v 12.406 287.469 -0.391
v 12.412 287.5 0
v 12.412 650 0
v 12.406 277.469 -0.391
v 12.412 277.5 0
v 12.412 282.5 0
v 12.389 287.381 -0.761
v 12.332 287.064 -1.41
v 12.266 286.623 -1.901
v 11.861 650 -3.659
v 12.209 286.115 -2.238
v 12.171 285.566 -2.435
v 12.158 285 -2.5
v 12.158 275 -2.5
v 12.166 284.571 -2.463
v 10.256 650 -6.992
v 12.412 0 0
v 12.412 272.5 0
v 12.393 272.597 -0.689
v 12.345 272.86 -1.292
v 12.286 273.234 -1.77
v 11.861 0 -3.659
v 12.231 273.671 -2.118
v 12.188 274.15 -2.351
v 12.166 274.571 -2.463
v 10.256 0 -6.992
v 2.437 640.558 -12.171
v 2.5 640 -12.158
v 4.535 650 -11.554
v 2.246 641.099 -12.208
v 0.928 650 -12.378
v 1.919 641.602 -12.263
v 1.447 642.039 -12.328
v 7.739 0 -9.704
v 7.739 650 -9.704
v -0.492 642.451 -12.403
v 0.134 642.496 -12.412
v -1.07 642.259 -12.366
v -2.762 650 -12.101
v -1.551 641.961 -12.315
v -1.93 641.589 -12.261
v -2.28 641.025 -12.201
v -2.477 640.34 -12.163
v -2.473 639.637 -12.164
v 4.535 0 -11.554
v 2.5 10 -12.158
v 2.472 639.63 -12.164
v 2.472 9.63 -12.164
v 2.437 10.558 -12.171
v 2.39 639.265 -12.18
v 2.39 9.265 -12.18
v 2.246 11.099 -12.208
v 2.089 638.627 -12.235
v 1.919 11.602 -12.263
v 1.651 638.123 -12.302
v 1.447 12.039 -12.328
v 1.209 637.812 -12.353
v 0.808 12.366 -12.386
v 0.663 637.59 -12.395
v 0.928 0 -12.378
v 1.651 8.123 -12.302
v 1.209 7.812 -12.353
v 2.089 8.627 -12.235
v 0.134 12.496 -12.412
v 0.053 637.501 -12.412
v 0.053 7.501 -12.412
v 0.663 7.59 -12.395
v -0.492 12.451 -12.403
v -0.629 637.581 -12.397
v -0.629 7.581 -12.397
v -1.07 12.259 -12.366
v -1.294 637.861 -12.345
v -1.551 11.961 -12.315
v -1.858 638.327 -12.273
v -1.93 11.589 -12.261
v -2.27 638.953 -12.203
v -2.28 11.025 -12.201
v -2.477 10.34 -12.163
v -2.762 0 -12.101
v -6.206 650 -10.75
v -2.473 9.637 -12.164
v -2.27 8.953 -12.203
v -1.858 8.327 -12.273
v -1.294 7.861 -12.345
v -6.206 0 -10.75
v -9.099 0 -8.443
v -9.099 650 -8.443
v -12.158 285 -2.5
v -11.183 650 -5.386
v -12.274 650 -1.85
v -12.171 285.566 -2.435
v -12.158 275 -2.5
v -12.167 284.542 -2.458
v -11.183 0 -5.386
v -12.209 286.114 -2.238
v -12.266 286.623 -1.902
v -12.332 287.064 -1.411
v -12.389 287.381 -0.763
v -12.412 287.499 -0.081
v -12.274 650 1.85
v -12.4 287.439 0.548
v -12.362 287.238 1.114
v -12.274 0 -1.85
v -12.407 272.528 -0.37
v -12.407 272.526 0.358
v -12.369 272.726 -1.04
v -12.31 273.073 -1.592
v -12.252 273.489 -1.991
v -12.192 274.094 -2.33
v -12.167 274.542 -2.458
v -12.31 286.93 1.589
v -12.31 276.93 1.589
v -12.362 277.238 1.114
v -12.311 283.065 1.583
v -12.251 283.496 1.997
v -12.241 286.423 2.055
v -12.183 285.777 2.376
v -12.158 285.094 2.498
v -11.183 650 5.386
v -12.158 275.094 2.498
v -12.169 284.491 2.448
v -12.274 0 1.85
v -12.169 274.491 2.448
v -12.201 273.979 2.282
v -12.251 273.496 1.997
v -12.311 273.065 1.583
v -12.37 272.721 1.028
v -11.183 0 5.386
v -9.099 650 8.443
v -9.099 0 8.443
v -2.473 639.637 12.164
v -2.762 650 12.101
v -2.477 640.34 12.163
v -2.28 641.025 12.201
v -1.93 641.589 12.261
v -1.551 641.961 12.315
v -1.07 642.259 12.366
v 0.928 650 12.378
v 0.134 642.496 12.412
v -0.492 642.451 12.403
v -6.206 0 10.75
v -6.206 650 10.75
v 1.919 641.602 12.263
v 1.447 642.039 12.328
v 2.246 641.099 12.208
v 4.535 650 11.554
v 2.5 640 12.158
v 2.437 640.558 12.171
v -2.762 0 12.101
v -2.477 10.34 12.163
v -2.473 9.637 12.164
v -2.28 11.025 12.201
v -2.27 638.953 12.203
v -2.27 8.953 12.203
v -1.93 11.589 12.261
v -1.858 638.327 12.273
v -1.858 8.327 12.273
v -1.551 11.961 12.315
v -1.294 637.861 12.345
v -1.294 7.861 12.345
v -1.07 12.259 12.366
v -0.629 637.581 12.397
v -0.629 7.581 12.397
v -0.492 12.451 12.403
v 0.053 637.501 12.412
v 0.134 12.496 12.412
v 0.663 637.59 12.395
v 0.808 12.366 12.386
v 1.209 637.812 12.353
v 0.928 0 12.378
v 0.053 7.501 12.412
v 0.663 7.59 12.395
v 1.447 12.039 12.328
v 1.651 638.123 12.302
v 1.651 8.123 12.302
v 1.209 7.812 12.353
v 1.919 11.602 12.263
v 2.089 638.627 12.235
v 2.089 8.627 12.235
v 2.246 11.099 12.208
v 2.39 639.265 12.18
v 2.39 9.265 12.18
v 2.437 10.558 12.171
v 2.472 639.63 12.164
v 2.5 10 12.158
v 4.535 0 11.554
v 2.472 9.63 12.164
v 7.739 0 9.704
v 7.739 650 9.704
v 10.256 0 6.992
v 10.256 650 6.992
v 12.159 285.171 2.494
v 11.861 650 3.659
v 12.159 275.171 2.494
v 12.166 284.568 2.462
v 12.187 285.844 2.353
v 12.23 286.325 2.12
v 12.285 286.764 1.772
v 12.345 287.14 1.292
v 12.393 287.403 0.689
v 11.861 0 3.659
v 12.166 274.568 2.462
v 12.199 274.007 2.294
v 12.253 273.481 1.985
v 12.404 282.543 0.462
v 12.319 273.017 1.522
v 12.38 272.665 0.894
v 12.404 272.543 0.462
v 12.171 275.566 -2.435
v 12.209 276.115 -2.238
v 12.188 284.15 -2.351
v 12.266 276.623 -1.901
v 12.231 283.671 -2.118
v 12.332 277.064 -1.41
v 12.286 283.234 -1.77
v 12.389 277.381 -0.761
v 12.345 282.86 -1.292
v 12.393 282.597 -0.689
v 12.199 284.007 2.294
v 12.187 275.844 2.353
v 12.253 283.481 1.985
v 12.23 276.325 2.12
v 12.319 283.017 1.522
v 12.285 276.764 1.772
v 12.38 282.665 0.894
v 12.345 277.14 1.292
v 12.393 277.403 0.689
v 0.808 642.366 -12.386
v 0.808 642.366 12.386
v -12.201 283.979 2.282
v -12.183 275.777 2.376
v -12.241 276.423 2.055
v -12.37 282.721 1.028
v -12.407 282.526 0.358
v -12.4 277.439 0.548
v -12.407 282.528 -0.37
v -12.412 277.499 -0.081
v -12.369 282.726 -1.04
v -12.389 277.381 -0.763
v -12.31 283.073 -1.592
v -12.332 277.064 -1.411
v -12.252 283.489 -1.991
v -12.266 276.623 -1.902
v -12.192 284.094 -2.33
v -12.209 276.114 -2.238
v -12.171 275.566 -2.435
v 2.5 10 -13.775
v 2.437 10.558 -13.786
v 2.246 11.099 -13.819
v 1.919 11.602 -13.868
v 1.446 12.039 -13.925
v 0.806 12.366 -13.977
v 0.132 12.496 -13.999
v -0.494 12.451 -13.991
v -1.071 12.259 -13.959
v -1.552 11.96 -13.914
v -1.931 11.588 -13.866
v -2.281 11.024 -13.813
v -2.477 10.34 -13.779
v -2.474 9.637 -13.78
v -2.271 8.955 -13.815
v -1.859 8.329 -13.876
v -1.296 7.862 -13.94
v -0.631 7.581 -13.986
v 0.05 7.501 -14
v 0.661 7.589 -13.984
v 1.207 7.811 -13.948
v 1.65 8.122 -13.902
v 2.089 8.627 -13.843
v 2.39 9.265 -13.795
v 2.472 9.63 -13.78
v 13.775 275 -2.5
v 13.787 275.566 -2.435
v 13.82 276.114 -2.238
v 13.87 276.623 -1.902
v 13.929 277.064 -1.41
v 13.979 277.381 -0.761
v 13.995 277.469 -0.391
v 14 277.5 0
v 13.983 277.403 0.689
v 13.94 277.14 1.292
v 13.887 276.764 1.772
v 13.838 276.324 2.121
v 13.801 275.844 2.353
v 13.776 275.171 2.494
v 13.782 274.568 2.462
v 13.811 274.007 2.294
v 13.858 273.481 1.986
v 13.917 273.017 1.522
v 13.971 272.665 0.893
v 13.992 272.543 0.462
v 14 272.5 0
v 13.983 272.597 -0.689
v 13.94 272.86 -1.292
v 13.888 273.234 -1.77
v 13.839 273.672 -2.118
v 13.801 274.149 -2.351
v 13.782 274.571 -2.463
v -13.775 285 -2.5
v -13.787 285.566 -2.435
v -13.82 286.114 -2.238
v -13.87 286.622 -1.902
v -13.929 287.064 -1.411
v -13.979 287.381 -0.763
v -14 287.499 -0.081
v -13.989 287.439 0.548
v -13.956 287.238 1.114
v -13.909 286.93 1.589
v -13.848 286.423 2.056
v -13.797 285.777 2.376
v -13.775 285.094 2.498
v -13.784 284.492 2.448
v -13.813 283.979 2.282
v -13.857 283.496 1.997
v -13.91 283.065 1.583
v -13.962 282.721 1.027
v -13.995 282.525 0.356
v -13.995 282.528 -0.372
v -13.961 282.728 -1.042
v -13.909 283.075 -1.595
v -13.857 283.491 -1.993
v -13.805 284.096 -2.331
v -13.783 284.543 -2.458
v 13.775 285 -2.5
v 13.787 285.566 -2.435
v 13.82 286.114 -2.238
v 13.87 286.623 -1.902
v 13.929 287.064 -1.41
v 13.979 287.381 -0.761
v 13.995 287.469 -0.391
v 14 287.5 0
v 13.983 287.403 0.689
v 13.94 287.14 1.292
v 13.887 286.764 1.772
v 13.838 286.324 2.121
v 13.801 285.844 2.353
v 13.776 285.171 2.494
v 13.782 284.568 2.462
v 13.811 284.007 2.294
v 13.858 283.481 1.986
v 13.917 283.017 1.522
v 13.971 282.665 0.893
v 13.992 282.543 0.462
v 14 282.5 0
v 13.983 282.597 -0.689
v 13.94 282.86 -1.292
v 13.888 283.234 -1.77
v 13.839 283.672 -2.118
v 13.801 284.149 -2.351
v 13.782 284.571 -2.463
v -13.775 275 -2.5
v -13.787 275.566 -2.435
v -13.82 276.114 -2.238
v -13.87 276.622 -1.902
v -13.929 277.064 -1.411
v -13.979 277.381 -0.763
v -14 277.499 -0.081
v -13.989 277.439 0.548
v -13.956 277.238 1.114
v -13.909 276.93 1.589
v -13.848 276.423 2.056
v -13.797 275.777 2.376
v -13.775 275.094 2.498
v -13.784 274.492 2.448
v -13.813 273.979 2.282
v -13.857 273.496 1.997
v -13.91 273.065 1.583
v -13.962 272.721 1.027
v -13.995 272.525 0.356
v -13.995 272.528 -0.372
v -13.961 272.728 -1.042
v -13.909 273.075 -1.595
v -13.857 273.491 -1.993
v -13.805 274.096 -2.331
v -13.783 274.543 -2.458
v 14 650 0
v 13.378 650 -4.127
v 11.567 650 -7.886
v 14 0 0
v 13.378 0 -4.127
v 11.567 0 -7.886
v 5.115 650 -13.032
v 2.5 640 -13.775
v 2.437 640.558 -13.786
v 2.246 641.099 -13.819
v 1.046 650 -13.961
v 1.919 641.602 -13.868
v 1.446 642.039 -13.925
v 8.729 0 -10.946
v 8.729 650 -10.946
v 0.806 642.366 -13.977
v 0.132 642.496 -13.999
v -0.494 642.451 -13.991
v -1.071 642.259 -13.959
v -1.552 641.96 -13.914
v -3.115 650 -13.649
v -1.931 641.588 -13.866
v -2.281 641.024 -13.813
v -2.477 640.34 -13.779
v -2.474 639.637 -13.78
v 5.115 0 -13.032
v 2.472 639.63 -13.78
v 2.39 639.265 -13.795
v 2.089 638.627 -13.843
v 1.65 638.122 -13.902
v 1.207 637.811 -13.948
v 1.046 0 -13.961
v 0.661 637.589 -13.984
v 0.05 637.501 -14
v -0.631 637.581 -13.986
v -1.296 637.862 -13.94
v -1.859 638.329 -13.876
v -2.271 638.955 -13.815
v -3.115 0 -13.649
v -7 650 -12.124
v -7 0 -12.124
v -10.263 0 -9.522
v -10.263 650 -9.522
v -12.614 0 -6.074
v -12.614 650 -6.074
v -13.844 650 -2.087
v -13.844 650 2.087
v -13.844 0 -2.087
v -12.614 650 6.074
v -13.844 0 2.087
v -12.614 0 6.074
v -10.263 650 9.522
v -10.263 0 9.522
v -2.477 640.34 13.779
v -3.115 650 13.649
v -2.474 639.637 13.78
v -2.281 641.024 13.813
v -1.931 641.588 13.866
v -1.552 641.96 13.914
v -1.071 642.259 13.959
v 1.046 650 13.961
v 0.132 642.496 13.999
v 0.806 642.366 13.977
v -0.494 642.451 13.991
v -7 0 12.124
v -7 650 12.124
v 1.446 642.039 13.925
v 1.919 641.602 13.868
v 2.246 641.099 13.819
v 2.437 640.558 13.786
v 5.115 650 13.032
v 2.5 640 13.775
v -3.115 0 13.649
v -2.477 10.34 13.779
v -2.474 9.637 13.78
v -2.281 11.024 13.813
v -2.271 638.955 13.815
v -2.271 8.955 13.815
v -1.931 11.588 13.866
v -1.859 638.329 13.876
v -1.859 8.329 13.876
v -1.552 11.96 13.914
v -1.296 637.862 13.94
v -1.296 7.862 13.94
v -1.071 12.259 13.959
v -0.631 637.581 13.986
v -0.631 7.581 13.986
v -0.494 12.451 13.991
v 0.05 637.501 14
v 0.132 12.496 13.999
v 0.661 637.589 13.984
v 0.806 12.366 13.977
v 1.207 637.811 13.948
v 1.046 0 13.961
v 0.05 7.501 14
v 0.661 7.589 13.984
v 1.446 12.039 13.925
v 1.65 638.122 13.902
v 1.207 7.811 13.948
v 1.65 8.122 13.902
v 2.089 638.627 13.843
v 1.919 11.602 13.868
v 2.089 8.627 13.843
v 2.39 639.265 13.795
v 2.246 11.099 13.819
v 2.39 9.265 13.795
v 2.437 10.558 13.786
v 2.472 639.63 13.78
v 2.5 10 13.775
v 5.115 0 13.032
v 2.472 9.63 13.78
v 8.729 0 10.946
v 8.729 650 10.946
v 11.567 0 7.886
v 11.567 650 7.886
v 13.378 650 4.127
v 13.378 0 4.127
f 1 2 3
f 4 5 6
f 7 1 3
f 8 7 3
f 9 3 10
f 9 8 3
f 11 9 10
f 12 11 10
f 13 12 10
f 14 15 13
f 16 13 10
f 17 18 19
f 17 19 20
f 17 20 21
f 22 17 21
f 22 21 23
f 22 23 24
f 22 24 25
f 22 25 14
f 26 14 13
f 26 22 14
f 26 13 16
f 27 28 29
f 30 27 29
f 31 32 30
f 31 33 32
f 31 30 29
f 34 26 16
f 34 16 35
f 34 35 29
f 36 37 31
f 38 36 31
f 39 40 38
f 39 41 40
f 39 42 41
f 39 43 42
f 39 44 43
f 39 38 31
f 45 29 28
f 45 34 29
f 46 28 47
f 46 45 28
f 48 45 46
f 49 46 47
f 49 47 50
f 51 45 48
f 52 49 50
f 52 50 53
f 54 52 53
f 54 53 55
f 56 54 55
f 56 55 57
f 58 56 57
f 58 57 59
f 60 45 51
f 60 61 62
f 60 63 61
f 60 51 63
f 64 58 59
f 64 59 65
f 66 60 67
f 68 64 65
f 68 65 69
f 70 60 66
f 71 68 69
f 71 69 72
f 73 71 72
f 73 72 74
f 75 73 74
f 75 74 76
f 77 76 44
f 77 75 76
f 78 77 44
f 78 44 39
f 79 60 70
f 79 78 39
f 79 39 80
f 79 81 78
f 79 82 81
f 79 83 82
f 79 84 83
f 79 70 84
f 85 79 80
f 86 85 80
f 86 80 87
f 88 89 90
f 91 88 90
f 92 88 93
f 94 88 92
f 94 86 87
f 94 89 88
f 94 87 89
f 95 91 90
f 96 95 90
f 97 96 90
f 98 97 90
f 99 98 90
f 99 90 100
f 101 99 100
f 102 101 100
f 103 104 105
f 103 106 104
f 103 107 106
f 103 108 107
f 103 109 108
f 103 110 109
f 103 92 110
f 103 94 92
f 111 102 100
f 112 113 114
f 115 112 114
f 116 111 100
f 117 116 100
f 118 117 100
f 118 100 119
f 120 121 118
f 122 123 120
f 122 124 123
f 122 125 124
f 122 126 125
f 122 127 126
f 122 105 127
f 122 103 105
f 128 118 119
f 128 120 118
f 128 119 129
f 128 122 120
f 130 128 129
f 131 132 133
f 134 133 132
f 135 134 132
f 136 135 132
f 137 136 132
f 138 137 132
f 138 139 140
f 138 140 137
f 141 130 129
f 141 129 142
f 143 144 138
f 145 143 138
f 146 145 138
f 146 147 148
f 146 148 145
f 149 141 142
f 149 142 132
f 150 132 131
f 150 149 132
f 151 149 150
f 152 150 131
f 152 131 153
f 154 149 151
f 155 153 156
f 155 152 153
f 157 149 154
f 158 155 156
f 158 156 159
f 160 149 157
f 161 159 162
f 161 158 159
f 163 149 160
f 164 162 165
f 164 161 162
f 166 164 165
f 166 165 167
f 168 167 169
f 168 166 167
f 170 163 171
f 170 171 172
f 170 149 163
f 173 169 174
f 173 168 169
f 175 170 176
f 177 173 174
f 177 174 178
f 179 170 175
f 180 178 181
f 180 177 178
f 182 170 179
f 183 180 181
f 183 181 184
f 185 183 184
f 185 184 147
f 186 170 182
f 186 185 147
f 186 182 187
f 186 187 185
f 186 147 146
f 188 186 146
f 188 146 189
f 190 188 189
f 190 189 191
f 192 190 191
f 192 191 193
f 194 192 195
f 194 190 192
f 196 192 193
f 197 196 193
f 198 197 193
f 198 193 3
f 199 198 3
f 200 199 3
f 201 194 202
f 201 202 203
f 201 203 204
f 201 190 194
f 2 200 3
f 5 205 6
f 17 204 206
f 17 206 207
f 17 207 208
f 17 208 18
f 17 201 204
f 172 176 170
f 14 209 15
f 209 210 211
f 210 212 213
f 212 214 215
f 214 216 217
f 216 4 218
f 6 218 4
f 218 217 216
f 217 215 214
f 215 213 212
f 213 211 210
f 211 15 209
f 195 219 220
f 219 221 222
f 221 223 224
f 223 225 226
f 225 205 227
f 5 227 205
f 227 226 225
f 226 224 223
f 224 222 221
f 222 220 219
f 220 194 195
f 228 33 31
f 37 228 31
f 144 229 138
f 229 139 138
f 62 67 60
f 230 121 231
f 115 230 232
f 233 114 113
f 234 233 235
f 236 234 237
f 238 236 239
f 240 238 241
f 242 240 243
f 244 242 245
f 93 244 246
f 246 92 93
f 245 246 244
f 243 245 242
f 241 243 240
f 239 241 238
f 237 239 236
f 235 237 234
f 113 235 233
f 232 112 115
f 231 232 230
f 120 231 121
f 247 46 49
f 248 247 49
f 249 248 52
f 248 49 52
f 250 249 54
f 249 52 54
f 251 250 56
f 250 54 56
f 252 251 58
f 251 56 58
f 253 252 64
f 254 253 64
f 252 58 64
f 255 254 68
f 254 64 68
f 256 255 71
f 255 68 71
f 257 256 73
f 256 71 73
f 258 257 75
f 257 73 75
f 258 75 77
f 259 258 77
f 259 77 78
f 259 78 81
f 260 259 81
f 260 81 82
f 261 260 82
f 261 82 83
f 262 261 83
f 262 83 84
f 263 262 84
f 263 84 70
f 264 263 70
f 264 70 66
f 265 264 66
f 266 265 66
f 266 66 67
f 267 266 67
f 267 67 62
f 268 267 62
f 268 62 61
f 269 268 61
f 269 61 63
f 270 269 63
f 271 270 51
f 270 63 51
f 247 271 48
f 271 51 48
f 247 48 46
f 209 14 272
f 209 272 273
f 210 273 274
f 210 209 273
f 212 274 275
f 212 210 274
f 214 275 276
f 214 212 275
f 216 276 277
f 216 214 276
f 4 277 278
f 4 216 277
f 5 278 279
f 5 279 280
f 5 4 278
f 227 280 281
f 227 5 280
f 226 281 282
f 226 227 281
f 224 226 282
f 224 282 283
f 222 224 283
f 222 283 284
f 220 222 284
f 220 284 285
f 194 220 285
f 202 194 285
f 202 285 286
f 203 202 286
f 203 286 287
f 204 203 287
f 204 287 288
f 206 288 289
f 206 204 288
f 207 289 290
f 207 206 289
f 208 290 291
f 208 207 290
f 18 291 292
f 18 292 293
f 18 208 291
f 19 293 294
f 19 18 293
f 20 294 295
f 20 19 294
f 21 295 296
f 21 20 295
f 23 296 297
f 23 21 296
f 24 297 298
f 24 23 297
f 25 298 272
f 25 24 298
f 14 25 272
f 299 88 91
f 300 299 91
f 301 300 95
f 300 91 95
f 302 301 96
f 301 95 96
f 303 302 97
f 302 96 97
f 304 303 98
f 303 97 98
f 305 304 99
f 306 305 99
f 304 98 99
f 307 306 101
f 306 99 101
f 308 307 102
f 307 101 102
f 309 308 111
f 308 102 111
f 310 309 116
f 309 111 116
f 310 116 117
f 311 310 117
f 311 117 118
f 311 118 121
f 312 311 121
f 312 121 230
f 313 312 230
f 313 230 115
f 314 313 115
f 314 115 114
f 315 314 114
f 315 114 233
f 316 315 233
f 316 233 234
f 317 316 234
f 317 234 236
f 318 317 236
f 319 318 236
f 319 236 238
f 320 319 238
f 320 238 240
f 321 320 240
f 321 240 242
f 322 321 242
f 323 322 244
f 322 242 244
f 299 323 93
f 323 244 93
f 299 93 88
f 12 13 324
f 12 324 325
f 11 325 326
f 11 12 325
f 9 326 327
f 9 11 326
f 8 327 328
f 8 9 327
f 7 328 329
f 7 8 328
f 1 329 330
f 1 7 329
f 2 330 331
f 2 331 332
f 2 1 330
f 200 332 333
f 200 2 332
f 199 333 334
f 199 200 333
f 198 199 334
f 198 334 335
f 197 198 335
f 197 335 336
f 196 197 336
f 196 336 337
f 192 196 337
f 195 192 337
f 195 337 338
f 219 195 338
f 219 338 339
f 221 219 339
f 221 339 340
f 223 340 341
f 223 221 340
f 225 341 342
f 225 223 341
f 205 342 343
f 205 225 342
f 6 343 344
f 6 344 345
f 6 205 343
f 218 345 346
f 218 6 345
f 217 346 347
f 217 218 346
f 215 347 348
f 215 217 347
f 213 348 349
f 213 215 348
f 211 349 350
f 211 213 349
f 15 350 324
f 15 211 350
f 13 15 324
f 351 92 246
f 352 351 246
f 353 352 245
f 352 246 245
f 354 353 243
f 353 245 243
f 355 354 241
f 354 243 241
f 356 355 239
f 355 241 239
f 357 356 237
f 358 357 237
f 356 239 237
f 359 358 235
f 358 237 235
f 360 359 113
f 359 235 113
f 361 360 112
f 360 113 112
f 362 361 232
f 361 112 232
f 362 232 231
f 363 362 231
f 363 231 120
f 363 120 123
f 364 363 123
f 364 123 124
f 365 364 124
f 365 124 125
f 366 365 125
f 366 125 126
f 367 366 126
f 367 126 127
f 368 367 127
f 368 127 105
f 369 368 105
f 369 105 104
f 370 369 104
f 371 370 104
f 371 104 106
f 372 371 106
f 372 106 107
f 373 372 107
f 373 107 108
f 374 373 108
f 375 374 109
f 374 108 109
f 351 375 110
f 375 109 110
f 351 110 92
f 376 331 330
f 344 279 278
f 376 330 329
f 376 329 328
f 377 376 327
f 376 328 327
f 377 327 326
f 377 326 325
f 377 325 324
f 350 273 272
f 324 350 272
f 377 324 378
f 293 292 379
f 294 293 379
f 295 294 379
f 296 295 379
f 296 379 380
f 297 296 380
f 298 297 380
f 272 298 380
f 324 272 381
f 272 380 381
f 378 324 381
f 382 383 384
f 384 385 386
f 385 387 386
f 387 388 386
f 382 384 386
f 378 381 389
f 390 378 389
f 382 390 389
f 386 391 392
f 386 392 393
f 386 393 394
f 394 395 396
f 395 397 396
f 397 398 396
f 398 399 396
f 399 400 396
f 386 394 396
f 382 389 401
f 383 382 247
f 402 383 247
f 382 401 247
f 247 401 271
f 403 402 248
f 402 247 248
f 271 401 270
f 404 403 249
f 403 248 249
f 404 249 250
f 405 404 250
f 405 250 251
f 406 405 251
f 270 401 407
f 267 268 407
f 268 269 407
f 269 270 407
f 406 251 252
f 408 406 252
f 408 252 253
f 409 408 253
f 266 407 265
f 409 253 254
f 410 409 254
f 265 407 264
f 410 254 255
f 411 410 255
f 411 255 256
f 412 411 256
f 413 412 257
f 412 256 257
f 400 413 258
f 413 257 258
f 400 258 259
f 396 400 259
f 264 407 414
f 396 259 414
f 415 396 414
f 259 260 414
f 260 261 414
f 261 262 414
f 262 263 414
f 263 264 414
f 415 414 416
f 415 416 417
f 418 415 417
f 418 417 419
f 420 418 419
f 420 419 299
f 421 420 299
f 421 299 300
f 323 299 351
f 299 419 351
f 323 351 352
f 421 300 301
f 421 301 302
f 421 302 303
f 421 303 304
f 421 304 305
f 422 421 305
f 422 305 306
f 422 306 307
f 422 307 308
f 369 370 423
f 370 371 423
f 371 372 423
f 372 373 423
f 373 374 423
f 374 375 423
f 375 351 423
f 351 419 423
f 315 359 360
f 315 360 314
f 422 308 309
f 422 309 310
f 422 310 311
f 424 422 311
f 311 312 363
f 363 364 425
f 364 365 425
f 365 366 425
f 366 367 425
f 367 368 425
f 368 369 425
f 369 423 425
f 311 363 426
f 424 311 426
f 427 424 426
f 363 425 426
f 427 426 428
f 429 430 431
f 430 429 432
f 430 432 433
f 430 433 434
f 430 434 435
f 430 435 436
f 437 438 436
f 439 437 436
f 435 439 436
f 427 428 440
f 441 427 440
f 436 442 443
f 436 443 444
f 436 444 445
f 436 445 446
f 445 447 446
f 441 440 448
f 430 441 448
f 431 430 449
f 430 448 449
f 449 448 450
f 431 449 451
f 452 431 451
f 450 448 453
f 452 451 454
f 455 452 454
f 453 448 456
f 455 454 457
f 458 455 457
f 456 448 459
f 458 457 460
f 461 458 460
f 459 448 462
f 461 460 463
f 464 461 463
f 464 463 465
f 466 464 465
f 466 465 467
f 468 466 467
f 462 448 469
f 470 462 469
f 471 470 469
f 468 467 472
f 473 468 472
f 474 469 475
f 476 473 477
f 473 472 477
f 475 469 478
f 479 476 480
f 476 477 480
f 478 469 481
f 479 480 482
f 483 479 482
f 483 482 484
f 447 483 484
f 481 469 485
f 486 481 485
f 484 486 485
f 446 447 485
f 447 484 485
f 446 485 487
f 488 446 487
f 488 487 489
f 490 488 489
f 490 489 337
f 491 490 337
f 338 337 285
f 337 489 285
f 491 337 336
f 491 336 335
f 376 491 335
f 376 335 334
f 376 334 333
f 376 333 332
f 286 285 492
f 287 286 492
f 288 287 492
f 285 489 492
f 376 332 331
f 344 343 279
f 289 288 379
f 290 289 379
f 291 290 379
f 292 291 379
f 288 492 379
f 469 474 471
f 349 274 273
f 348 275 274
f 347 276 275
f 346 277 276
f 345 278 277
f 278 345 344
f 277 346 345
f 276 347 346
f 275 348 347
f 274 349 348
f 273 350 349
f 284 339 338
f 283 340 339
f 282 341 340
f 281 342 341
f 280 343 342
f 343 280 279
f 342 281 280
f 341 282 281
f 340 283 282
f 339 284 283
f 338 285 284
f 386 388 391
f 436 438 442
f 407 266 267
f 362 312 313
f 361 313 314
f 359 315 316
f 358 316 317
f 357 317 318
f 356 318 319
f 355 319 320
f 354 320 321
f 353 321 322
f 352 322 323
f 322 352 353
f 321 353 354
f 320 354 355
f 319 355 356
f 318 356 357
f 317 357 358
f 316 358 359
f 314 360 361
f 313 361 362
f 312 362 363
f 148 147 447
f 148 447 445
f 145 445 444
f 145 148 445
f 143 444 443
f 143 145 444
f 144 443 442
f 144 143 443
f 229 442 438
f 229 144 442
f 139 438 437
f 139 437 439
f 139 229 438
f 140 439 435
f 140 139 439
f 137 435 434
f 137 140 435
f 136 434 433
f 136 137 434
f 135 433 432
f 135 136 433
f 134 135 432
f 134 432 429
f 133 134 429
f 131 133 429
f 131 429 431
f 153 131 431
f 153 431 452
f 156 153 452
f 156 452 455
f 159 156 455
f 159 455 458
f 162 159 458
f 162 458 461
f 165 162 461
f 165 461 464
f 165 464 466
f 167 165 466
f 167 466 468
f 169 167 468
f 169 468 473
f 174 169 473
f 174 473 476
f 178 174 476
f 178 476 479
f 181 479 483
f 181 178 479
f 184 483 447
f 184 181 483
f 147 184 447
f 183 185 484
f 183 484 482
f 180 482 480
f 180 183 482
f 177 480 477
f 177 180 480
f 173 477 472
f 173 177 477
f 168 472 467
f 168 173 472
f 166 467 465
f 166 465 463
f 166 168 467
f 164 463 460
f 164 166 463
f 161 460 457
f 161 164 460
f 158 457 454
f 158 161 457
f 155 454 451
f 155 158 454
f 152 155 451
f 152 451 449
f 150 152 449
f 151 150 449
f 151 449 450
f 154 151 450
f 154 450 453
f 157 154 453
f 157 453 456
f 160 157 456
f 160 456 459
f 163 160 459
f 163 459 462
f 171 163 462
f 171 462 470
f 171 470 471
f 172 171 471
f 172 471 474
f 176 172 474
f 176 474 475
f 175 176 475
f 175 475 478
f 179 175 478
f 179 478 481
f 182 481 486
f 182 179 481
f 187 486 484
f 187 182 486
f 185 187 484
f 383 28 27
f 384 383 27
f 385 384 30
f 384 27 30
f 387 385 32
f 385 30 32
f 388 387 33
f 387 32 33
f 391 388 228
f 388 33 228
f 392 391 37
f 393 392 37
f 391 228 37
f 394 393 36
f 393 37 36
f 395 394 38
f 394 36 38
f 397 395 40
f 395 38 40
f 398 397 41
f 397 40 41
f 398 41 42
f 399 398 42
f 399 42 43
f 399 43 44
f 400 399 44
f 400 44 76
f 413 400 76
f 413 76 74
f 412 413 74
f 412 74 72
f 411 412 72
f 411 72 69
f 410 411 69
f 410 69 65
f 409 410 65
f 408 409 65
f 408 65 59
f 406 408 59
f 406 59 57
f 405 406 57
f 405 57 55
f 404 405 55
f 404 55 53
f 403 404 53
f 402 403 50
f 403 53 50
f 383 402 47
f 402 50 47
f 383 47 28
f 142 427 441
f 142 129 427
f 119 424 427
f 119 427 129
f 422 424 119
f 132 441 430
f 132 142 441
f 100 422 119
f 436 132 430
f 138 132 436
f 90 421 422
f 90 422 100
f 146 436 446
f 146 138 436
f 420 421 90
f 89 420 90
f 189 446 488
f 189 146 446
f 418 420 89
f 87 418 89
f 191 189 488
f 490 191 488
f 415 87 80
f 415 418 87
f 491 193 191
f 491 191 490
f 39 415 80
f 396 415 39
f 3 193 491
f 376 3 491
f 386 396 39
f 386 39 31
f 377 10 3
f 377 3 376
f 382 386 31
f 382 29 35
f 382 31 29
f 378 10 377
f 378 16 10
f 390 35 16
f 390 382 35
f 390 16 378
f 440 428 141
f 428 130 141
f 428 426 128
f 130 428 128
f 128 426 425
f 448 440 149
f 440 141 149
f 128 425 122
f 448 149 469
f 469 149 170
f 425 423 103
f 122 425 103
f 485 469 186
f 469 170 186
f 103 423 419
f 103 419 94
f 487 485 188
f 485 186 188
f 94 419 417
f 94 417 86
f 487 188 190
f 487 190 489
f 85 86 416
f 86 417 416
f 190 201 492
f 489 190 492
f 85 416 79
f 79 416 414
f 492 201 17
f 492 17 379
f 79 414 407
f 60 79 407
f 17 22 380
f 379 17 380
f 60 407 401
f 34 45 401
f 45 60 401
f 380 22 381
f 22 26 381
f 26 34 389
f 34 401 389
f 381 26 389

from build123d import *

# Parameters (mm, degrees)
SKETCH1_R               = 14
SKETCH1_R_2             = 12.4125
BOSS_EXTRUDE1_DEPTH     = 650
SKETCH2_R               = 2.5
CUT_EXTRUDE2_DEPTH      = 15
CUT_EXTRUDE2_DEPTH_BACK = 15
SKETCH6_R               = 2.5
CUT_EXTRUDE4_DEPTH      = 15.0000001
CUT_EXTRUDE4_DEPTH_BACK = 15.0000001


with BuildPart() as part:
    # Sketch1 → Boss-Extrude1 (new body)
    with BuildSketch(Plane(origin=(0, 0, 0), x_dir=(1, 0, 0), z_dir=(0, 1, 0))):
        Circle(SKETCH1_R)
        Circle(SKETCH1_R_2, mode=Mode.SUBTRACT)
    extrude(amount=BOSS_EXTRUDE1_DEPTH)

    # Sketch2 → Cut-Extrude2 (cut, two sides)
    with BuildSketch(Plane.XY) as cut_extrude2_sk:
        with Locations((0, 10)):
            Circle(SKETCH2_R)
        with Locations((0, 640)):
            Circle(SKETCH2_R)
    extrude(amount=CUT_EXTRUDE2_DEPTH, mode=Mode.SUBTRACT)
    extrude(cut_extrude2_sk.sketch, amount=-CUT_EXTRUDE2_DEPTH_BACK, mode=Mode.SUBTRACT)

    # Sketch6 → Cut-Extrude4 (cut, two sides)
    with BuildSketch(Plane(origin=(0, 0, 0), x_dir=(0, 0, -1), z_dir=(1, 0, 0))) as cut_extrude4_sk:
        with Locations((0, 285)):
            Circle(SKETCH6_R)
        with Locations((0, 275)):
            Circle(SKETCH6_R)
    extrude(amount=CUT_EXTRUDE4_DEPTH, mode=Mode.SUBTRACT)
    extrude(cut_extrude4_sk.sketch, amount=-CUT_EXTRUDE4_DEPTH_BACK, mode=Mode.SUBTRACT)


solid = part.part
